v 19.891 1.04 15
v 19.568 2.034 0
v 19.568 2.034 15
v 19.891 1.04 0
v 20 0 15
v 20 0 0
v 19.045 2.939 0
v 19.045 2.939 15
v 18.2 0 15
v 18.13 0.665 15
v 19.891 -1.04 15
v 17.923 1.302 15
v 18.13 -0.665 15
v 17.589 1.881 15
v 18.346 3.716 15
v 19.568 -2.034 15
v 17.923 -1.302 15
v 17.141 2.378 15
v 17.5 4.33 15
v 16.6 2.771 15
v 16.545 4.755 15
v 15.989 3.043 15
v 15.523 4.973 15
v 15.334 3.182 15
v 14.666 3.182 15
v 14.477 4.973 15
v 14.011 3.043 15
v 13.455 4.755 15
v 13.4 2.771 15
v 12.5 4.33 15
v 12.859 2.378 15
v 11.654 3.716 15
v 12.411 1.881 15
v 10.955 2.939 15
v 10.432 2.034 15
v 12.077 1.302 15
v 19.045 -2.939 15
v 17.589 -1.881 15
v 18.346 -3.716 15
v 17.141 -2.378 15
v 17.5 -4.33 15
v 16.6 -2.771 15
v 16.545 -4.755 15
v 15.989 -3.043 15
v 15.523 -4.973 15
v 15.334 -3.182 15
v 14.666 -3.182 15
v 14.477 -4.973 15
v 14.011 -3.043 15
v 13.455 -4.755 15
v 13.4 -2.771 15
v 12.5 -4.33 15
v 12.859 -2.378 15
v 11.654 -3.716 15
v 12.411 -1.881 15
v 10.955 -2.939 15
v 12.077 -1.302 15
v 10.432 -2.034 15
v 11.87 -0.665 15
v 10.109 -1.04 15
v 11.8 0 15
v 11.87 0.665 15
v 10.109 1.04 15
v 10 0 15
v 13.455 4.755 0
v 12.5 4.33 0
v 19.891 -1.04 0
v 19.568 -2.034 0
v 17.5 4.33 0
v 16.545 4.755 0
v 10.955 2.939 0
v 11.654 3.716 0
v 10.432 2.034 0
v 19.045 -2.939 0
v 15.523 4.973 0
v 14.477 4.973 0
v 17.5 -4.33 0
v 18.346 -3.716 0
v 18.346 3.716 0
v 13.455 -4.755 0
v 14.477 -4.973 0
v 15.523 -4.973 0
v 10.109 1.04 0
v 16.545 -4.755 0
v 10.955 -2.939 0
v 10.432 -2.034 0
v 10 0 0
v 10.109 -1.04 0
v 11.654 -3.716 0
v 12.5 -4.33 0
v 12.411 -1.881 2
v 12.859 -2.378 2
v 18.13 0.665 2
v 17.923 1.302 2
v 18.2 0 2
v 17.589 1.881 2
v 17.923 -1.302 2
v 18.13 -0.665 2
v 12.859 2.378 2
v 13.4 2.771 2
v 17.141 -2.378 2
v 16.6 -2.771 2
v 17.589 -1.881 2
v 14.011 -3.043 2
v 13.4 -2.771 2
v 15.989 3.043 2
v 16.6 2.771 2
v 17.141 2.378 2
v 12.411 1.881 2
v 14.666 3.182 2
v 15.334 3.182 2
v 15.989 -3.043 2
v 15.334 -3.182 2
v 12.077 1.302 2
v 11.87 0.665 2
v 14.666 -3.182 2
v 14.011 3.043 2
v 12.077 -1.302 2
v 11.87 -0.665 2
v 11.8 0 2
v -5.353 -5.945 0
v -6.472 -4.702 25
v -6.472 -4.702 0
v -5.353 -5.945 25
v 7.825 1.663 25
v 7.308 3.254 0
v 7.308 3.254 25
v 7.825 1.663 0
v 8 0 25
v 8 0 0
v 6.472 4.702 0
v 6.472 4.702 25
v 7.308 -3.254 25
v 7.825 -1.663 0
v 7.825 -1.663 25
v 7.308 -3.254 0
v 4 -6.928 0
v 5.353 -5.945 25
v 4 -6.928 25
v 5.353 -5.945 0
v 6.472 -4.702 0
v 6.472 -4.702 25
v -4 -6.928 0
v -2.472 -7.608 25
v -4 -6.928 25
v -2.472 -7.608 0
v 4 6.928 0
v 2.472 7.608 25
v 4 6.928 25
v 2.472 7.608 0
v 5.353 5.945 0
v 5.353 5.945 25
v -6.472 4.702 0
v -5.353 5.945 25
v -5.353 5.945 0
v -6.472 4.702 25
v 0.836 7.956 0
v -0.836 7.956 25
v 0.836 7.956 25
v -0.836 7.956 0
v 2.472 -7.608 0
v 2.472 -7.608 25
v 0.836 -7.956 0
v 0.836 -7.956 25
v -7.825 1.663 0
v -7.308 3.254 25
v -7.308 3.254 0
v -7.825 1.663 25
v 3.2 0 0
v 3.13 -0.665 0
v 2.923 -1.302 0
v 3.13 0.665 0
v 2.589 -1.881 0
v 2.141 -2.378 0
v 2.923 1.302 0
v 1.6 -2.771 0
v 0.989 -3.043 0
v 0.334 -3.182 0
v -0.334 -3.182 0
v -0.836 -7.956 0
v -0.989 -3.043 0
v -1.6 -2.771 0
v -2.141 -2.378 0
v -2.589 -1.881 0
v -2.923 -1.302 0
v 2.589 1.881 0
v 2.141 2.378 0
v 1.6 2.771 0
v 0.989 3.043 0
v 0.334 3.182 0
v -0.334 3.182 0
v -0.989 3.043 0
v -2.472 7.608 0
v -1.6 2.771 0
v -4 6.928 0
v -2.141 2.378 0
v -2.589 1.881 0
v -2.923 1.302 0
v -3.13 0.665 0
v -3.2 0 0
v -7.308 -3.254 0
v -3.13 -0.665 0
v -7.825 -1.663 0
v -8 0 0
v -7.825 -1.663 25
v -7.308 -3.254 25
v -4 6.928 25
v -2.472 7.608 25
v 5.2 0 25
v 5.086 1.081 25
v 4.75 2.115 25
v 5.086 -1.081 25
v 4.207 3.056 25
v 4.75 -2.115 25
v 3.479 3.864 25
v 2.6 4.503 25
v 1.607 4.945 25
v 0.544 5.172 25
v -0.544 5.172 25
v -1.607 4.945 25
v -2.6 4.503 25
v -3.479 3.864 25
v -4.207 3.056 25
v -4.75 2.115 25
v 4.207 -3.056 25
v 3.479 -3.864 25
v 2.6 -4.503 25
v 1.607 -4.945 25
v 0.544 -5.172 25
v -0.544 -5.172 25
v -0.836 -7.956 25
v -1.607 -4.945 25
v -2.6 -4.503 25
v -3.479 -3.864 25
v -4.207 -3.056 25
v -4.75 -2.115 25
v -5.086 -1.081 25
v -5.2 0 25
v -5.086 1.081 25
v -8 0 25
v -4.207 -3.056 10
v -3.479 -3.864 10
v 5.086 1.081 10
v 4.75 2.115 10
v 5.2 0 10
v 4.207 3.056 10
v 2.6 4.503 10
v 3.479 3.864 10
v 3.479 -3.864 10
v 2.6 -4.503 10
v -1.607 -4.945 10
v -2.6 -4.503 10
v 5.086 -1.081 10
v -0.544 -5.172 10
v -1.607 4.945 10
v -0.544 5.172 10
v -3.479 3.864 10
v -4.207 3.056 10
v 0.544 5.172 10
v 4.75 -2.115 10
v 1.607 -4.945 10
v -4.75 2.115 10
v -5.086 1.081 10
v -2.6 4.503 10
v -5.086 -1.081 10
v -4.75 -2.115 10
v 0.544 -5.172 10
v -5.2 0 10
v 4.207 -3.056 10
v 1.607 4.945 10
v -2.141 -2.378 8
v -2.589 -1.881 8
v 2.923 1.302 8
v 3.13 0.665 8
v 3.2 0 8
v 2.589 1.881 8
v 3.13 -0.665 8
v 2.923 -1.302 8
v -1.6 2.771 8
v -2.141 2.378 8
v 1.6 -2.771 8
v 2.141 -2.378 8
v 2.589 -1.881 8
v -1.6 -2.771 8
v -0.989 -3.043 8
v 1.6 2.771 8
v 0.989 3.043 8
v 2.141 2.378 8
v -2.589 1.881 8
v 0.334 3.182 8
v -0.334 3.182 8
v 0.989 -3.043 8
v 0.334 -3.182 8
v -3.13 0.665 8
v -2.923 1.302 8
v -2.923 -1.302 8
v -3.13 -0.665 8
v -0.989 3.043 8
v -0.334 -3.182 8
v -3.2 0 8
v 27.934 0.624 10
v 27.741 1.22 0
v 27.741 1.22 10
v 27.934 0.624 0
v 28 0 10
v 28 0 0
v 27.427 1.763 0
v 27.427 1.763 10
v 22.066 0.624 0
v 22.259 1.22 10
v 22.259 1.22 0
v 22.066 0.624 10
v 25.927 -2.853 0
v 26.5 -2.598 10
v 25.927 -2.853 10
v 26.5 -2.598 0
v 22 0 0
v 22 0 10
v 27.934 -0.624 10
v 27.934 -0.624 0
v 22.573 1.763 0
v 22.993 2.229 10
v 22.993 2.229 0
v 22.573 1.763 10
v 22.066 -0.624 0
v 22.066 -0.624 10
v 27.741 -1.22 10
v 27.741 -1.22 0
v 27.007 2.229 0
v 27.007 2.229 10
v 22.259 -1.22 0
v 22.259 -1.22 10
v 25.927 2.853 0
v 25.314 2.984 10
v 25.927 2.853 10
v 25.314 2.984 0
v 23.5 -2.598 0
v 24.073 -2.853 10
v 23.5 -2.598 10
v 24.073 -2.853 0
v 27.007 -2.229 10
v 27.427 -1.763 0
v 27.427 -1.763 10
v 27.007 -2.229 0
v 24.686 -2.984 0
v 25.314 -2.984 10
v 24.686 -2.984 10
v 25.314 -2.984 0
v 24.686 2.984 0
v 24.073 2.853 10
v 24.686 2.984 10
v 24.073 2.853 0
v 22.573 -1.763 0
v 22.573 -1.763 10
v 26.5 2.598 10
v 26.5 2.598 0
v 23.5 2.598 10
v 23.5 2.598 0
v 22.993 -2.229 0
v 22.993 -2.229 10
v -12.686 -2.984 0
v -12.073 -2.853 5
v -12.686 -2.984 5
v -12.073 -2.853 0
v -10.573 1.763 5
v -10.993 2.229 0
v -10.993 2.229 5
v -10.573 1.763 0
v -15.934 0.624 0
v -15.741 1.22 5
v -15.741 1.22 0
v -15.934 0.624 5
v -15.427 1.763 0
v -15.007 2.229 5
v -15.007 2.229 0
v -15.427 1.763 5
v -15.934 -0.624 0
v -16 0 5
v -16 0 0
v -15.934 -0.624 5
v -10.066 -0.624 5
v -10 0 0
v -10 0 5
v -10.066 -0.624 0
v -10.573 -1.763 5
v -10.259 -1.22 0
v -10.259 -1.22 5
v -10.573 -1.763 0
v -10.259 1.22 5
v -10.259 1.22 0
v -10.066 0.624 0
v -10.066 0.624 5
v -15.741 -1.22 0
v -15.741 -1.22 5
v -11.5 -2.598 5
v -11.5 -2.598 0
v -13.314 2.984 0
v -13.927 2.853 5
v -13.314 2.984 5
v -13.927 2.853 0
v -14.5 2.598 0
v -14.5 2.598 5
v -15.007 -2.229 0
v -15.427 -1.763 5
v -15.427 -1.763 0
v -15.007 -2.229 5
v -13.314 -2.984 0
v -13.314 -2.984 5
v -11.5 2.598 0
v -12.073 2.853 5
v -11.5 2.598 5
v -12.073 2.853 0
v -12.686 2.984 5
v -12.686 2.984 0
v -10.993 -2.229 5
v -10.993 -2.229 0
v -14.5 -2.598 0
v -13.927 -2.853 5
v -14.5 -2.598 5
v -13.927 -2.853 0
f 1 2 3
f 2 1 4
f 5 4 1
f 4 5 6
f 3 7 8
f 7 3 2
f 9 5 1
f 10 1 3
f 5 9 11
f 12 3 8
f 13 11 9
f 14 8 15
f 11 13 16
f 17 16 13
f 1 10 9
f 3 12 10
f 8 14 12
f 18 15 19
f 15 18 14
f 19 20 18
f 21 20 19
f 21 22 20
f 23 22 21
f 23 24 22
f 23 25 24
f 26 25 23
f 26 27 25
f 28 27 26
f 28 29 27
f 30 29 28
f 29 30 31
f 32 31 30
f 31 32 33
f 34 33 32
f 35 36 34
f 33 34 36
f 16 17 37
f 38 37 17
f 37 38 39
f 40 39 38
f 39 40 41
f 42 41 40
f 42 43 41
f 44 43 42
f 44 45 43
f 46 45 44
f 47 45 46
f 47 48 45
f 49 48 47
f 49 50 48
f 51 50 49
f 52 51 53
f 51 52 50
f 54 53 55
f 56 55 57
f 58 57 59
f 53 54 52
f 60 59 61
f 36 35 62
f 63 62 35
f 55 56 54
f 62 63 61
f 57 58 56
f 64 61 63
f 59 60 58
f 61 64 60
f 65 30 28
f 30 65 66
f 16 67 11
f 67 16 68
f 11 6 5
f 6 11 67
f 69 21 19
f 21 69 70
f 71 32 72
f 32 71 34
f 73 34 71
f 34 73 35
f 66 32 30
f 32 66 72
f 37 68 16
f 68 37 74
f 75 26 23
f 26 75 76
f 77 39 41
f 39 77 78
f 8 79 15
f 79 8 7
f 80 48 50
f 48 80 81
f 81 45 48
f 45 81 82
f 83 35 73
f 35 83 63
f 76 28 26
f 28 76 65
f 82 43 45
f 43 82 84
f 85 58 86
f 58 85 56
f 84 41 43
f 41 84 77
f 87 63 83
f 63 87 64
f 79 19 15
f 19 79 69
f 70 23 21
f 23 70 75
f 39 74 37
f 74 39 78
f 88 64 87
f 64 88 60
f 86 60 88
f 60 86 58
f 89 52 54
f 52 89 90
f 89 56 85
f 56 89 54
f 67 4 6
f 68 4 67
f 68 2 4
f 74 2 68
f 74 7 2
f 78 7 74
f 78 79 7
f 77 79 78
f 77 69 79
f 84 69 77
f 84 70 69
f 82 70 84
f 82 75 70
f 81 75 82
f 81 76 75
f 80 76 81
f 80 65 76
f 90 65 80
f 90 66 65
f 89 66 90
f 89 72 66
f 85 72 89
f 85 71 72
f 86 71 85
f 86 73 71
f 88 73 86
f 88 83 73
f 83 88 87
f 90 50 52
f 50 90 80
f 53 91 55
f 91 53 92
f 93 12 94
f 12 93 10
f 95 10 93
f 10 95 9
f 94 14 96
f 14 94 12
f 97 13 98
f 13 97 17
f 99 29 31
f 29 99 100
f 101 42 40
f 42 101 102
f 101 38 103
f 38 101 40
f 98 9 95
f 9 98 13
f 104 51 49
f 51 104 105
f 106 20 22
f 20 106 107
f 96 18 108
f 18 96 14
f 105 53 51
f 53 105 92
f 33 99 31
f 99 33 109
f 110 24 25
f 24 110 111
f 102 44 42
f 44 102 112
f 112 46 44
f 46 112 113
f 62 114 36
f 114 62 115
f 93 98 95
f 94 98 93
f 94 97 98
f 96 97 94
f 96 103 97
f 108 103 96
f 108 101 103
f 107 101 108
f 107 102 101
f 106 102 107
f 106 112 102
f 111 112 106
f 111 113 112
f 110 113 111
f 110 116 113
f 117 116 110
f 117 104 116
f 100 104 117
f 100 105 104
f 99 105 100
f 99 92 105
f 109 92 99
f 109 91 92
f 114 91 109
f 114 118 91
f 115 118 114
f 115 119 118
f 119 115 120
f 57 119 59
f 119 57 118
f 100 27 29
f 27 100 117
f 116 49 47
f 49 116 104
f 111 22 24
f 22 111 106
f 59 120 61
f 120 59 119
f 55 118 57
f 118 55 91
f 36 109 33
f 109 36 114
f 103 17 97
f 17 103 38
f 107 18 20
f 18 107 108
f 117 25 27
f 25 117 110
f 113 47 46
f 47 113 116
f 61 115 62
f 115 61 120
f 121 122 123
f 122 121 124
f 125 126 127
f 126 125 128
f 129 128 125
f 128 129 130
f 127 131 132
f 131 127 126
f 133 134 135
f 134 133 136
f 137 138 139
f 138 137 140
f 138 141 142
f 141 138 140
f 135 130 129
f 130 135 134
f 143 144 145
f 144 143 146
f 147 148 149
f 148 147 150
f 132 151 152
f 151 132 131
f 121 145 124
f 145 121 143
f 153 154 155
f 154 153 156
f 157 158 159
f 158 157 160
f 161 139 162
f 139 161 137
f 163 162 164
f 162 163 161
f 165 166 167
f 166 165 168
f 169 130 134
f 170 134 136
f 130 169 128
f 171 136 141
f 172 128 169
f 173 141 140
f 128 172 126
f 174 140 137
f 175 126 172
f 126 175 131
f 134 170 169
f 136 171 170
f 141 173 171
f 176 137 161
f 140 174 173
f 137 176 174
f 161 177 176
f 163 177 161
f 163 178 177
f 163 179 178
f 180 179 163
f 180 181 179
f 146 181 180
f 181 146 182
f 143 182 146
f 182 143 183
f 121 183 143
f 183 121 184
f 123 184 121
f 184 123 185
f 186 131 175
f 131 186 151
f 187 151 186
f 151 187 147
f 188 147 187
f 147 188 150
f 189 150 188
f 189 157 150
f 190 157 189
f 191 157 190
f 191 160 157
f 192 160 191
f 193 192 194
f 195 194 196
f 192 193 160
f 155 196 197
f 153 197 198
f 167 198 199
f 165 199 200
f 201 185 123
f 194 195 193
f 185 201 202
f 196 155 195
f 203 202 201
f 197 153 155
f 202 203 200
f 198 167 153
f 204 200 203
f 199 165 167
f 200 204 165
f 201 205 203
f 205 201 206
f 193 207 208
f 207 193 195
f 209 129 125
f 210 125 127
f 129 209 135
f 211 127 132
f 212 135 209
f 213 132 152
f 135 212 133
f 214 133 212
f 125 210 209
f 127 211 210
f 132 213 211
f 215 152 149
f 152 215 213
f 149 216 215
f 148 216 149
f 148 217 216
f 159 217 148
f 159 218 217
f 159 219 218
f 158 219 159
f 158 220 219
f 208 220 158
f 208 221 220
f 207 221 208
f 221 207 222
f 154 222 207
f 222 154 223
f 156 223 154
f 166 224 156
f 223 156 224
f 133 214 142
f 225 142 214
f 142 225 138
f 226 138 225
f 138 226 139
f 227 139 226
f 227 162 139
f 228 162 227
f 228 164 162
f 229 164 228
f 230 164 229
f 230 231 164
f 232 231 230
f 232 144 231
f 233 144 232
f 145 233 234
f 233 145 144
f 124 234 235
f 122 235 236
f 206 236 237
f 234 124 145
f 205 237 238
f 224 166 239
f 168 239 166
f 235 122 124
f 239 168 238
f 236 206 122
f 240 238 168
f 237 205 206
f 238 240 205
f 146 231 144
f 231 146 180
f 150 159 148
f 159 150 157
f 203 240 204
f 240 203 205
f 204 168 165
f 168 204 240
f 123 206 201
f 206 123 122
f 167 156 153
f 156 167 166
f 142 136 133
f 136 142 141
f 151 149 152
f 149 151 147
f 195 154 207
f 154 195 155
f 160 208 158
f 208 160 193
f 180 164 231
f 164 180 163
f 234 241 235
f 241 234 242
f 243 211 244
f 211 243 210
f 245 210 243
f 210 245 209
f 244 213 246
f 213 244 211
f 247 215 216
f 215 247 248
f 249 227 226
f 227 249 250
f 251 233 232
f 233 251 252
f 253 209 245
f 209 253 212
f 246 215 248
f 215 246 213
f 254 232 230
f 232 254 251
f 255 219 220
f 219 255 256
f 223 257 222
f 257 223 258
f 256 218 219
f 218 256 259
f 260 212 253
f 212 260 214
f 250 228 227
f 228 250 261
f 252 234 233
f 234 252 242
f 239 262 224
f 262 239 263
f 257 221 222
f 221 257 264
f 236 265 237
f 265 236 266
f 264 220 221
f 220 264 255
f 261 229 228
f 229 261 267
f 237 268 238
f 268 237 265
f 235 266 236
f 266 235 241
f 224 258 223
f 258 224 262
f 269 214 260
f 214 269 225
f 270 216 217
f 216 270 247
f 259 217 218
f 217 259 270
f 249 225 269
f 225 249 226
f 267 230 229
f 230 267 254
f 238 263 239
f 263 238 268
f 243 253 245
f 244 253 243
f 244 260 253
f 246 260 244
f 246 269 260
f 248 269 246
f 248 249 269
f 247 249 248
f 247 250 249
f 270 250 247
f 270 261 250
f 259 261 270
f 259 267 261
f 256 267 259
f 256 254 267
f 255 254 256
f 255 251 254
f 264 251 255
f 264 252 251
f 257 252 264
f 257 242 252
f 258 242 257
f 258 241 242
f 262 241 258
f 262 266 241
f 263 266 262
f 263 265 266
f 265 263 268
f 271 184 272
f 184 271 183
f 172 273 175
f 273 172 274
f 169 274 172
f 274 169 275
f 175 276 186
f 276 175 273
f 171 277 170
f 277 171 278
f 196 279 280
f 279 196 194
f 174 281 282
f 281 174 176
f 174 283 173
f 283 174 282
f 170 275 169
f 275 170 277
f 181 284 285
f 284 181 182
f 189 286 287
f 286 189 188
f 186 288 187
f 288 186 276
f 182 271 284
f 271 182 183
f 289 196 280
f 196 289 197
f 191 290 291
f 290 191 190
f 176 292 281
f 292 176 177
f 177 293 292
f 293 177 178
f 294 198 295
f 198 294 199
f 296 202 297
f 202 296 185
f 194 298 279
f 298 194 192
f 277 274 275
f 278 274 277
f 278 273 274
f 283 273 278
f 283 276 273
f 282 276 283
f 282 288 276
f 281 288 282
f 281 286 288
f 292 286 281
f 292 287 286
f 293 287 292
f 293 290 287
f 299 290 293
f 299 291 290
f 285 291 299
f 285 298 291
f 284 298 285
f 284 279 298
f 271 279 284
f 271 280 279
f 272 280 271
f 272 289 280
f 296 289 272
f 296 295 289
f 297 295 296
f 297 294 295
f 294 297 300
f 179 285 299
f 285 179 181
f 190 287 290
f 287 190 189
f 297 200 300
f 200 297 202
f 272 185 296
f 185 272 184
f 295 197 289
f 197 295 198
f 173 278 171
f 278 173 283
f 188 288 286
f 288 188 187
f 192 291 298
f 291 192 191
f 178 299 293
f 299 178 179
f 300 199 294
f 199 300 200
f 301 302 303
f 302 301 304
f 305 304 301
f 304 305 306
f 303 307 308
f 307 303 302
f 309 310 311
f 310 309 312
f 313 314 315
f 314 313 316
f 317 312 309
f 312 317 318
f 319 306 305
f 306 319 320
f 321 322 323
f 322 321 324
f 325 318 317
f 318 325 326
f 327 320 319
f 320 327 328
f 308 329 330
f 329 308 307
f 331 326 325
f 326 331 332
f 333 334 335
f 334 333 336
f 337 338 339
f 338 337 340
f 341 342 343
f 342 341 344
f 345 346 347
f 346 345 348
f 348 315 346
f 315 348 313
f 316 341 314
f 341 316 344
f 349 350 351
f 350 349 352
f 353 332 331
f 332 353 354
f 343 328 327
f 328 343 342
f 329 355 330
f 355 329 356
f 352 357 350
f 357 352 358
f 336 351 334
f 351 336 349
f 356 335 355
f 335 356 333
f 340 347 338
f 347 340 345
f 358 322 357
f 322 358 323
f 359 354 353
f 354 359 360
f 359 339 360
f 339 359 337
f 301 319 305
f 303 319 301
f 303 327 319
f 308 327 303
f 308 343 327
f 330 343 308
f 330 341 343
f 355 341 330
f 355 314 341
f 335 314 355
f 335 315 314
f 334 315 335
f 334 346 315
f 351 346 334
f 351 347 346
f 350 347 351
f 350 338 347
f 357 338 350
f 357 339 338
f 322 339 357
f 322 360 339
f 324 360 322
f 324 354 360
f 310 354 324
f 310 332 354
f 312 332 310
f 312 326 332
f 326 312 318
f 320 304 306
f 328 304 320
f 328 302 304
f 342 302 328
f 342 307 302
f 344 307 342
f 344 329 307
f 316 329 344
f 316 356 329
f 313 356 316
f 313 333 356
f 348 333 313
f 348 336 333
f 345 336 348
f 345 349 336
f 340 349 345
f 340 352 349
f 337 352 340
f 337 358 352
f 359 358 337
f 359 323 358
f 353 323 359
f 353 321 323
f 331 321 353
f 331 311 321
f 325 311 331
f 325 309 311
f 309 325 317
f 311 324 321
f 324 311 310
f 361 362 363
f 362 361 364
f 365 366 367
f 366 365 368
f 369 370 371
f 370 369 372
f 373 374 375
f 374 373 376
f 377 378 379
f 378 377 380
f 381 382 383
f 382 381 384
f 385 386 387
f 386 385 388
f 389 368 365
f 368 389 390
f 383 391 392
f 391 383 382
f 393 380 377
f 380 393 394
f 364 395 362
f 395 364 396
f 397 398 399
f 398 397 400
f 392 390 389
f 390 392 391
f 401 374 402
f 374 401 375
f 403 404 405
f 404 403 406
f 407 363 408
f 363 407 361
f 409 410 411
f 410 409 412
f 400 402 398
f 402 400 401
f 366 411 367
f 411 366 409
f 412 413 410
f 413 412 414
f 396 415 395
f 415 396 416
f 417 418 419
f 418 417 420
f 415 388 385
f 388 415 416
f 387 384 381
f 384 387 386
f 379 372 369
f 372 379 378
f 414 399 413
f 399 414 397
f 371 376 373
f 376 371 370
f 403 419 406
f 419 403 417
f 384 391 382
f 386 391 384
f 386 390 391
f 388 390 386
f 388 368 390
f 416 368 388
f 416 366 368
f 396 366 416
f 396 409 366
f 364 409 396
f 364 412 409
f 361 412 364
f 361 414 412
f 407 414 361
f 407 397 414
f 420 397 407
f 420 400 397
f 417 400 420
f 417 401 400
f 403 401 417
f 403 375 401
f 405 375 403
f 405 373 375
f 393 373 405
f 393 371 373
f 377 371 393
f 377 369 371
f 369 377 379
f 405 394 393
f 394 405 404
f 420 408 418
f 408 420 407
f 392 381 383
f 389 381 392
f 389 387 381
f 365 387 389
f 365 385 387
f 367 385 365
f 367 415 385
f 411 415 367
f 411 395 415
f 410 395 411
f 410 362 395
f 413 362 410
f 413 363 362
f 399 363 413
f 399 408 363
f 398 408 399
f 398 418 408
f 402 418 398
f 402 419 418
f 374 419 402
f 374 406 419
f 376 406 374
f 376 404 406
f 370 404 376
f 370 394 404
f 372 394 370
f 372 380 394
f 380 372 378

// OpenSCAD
// Custom magnetic spring
// By Magonegro JUL-2016
// Uses two cylindrical magnets placed in opposite magnetic orientation.
// Depending on the strength of the magnets the spring lenght may vary.
// Insert the magnets and top in the piston and holder and fix them with glue
// You have a working everlasting magnetic spring.

// Piston parameters
// Radius for the piston:
RADIUS_IN=5;
// Height of the piston:
HEIGHT_IN=15;
// Magnet height
MAGHEIGHT=3;
// Magnet radius
MAGRADIUS=3;
// Holder radius:
RADIUS_OUT=8;
// Holder height
HEIGHT_OUT=25;
// Holder base height
BASEHEIGHT_OUT=10;
// Resolution
FACETS=30;
// Tolerance (0.2mm typ)
TOLERANCE=0.2;

// Piston
translate([RADIUS_OUT+RADIUS_IN+2,0,0]) 
    {
    difference()
        {
        cylinder(r=RADIUS_IN,h=HEIGHT_IN,$fn=FACETS);
        translate([0,0,2]) cylinder(r=MAGRADIUS+TOLERANCE,h=HEIGHT_IN-2,$fn=FACETS);
        }
    }

// Part to fix the magnet to the piston
translate([RADIUS_OUT+2*RADIUS_IN+2+MAGRADIUS+2,0,0])
    {
    cylinder(r=MAGRADIUS,h=HEIGHT_IN-2-MAGHEIGHT,$fn=FACETS);
    }

// Holder
union()
{
    difference()
    {
        cylinder(r=RADIUS_OUT,h=HEIGHT_OUT,$fn=FACETS);
        cylinder(r=RADIUS_IN+TOLERANCE,h=HEIGHT_OUT,$fn=FACETS);
    }
    difference()
    {
    cylinder(r=RADIUS_OUT,h=BASEHEIGHT_OUT,$fn=FACETS);
    cylinder(r=MAGRADIUS+TOLERANCE,h=BASEHEIGHT_OUT-2,$fn=FACETS);
    }
}

// To fix the magnet to the holder
translate([-RADIUS_OUT-MAGRADIUS-2,0,0])
    {
    cylinder(r=MAGRADIUS,h=BASEHEIGHT_OUT-2-MAGHEIGHT,$fn=FACETS);
    }
